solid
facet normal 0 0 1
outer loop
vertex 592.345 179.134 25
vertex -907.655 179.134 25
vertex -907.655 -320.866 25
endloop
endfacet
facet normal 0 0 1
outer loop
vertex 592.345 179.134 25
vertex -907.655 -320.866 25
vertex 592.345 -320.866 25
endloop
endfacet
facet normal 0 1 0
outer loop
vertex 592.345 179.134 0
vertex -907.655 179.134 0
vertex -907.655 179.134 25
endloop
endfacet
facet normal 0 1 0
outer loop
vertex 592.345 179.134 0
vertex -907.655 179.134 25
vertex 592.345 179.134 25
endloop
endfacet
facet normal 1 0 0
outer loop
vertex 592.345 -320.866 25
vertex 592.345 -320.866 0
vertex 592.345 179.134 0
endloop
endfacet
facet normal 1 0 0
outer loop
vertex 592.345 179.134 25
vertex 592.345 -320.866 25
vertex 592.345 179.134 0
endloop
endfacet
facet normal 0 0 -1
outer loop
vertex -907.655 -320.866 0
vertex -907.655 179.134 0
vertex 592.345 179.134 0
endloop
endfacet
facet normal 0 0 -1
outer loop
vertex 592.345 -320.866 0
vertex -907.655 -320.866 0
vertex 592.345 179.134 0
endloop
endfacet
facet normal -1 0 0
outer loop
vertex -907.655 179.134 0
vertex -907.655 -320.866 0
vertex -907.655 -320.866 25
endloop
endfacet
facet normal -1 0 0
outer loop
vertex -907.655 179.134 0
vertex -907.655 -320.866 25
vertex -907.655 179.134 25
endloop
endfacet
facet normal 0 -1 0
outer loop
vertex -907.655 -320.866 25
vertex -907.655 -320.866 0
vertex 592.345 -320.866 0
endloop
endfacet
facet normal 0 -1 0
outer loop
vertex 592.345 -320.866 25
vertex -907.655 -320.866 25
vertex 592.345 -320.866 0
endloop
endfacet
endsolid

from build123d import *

# Parameters (mm, degrees)
F0_W     = 1500
F0_H     = 500
F1_DEPTH = 25
F2_DEPTH = 25
F3_DEPTH = 25


with BuildPart() as f1:
    # F0 (on Top) → F1 (new body)
    with BuildSketch(Plane.XY):
        with Locations((-157.654971, -70.865509)):
            Rectangle(F0_W, F0_H)
    extrude(amount=F1_DEPTH)

    # F0 (on Top) → F2 (join)
    with BuildSketch(Plane.XY):
        with Locations((-157.654971, -70.865509)):
            Rectangle(F0_W, F0_H)
    extrude(amount=F2_DEPTH)

    # F0 (on Top) → F3 (join)
    with BuildSketch(Plane.XY):
        with Locations((-157.654971, -70.865509)):
            Rectangle(F0_W, F0_H)
    extrude(amount=F3_DEPTH)


solid = f1.part
